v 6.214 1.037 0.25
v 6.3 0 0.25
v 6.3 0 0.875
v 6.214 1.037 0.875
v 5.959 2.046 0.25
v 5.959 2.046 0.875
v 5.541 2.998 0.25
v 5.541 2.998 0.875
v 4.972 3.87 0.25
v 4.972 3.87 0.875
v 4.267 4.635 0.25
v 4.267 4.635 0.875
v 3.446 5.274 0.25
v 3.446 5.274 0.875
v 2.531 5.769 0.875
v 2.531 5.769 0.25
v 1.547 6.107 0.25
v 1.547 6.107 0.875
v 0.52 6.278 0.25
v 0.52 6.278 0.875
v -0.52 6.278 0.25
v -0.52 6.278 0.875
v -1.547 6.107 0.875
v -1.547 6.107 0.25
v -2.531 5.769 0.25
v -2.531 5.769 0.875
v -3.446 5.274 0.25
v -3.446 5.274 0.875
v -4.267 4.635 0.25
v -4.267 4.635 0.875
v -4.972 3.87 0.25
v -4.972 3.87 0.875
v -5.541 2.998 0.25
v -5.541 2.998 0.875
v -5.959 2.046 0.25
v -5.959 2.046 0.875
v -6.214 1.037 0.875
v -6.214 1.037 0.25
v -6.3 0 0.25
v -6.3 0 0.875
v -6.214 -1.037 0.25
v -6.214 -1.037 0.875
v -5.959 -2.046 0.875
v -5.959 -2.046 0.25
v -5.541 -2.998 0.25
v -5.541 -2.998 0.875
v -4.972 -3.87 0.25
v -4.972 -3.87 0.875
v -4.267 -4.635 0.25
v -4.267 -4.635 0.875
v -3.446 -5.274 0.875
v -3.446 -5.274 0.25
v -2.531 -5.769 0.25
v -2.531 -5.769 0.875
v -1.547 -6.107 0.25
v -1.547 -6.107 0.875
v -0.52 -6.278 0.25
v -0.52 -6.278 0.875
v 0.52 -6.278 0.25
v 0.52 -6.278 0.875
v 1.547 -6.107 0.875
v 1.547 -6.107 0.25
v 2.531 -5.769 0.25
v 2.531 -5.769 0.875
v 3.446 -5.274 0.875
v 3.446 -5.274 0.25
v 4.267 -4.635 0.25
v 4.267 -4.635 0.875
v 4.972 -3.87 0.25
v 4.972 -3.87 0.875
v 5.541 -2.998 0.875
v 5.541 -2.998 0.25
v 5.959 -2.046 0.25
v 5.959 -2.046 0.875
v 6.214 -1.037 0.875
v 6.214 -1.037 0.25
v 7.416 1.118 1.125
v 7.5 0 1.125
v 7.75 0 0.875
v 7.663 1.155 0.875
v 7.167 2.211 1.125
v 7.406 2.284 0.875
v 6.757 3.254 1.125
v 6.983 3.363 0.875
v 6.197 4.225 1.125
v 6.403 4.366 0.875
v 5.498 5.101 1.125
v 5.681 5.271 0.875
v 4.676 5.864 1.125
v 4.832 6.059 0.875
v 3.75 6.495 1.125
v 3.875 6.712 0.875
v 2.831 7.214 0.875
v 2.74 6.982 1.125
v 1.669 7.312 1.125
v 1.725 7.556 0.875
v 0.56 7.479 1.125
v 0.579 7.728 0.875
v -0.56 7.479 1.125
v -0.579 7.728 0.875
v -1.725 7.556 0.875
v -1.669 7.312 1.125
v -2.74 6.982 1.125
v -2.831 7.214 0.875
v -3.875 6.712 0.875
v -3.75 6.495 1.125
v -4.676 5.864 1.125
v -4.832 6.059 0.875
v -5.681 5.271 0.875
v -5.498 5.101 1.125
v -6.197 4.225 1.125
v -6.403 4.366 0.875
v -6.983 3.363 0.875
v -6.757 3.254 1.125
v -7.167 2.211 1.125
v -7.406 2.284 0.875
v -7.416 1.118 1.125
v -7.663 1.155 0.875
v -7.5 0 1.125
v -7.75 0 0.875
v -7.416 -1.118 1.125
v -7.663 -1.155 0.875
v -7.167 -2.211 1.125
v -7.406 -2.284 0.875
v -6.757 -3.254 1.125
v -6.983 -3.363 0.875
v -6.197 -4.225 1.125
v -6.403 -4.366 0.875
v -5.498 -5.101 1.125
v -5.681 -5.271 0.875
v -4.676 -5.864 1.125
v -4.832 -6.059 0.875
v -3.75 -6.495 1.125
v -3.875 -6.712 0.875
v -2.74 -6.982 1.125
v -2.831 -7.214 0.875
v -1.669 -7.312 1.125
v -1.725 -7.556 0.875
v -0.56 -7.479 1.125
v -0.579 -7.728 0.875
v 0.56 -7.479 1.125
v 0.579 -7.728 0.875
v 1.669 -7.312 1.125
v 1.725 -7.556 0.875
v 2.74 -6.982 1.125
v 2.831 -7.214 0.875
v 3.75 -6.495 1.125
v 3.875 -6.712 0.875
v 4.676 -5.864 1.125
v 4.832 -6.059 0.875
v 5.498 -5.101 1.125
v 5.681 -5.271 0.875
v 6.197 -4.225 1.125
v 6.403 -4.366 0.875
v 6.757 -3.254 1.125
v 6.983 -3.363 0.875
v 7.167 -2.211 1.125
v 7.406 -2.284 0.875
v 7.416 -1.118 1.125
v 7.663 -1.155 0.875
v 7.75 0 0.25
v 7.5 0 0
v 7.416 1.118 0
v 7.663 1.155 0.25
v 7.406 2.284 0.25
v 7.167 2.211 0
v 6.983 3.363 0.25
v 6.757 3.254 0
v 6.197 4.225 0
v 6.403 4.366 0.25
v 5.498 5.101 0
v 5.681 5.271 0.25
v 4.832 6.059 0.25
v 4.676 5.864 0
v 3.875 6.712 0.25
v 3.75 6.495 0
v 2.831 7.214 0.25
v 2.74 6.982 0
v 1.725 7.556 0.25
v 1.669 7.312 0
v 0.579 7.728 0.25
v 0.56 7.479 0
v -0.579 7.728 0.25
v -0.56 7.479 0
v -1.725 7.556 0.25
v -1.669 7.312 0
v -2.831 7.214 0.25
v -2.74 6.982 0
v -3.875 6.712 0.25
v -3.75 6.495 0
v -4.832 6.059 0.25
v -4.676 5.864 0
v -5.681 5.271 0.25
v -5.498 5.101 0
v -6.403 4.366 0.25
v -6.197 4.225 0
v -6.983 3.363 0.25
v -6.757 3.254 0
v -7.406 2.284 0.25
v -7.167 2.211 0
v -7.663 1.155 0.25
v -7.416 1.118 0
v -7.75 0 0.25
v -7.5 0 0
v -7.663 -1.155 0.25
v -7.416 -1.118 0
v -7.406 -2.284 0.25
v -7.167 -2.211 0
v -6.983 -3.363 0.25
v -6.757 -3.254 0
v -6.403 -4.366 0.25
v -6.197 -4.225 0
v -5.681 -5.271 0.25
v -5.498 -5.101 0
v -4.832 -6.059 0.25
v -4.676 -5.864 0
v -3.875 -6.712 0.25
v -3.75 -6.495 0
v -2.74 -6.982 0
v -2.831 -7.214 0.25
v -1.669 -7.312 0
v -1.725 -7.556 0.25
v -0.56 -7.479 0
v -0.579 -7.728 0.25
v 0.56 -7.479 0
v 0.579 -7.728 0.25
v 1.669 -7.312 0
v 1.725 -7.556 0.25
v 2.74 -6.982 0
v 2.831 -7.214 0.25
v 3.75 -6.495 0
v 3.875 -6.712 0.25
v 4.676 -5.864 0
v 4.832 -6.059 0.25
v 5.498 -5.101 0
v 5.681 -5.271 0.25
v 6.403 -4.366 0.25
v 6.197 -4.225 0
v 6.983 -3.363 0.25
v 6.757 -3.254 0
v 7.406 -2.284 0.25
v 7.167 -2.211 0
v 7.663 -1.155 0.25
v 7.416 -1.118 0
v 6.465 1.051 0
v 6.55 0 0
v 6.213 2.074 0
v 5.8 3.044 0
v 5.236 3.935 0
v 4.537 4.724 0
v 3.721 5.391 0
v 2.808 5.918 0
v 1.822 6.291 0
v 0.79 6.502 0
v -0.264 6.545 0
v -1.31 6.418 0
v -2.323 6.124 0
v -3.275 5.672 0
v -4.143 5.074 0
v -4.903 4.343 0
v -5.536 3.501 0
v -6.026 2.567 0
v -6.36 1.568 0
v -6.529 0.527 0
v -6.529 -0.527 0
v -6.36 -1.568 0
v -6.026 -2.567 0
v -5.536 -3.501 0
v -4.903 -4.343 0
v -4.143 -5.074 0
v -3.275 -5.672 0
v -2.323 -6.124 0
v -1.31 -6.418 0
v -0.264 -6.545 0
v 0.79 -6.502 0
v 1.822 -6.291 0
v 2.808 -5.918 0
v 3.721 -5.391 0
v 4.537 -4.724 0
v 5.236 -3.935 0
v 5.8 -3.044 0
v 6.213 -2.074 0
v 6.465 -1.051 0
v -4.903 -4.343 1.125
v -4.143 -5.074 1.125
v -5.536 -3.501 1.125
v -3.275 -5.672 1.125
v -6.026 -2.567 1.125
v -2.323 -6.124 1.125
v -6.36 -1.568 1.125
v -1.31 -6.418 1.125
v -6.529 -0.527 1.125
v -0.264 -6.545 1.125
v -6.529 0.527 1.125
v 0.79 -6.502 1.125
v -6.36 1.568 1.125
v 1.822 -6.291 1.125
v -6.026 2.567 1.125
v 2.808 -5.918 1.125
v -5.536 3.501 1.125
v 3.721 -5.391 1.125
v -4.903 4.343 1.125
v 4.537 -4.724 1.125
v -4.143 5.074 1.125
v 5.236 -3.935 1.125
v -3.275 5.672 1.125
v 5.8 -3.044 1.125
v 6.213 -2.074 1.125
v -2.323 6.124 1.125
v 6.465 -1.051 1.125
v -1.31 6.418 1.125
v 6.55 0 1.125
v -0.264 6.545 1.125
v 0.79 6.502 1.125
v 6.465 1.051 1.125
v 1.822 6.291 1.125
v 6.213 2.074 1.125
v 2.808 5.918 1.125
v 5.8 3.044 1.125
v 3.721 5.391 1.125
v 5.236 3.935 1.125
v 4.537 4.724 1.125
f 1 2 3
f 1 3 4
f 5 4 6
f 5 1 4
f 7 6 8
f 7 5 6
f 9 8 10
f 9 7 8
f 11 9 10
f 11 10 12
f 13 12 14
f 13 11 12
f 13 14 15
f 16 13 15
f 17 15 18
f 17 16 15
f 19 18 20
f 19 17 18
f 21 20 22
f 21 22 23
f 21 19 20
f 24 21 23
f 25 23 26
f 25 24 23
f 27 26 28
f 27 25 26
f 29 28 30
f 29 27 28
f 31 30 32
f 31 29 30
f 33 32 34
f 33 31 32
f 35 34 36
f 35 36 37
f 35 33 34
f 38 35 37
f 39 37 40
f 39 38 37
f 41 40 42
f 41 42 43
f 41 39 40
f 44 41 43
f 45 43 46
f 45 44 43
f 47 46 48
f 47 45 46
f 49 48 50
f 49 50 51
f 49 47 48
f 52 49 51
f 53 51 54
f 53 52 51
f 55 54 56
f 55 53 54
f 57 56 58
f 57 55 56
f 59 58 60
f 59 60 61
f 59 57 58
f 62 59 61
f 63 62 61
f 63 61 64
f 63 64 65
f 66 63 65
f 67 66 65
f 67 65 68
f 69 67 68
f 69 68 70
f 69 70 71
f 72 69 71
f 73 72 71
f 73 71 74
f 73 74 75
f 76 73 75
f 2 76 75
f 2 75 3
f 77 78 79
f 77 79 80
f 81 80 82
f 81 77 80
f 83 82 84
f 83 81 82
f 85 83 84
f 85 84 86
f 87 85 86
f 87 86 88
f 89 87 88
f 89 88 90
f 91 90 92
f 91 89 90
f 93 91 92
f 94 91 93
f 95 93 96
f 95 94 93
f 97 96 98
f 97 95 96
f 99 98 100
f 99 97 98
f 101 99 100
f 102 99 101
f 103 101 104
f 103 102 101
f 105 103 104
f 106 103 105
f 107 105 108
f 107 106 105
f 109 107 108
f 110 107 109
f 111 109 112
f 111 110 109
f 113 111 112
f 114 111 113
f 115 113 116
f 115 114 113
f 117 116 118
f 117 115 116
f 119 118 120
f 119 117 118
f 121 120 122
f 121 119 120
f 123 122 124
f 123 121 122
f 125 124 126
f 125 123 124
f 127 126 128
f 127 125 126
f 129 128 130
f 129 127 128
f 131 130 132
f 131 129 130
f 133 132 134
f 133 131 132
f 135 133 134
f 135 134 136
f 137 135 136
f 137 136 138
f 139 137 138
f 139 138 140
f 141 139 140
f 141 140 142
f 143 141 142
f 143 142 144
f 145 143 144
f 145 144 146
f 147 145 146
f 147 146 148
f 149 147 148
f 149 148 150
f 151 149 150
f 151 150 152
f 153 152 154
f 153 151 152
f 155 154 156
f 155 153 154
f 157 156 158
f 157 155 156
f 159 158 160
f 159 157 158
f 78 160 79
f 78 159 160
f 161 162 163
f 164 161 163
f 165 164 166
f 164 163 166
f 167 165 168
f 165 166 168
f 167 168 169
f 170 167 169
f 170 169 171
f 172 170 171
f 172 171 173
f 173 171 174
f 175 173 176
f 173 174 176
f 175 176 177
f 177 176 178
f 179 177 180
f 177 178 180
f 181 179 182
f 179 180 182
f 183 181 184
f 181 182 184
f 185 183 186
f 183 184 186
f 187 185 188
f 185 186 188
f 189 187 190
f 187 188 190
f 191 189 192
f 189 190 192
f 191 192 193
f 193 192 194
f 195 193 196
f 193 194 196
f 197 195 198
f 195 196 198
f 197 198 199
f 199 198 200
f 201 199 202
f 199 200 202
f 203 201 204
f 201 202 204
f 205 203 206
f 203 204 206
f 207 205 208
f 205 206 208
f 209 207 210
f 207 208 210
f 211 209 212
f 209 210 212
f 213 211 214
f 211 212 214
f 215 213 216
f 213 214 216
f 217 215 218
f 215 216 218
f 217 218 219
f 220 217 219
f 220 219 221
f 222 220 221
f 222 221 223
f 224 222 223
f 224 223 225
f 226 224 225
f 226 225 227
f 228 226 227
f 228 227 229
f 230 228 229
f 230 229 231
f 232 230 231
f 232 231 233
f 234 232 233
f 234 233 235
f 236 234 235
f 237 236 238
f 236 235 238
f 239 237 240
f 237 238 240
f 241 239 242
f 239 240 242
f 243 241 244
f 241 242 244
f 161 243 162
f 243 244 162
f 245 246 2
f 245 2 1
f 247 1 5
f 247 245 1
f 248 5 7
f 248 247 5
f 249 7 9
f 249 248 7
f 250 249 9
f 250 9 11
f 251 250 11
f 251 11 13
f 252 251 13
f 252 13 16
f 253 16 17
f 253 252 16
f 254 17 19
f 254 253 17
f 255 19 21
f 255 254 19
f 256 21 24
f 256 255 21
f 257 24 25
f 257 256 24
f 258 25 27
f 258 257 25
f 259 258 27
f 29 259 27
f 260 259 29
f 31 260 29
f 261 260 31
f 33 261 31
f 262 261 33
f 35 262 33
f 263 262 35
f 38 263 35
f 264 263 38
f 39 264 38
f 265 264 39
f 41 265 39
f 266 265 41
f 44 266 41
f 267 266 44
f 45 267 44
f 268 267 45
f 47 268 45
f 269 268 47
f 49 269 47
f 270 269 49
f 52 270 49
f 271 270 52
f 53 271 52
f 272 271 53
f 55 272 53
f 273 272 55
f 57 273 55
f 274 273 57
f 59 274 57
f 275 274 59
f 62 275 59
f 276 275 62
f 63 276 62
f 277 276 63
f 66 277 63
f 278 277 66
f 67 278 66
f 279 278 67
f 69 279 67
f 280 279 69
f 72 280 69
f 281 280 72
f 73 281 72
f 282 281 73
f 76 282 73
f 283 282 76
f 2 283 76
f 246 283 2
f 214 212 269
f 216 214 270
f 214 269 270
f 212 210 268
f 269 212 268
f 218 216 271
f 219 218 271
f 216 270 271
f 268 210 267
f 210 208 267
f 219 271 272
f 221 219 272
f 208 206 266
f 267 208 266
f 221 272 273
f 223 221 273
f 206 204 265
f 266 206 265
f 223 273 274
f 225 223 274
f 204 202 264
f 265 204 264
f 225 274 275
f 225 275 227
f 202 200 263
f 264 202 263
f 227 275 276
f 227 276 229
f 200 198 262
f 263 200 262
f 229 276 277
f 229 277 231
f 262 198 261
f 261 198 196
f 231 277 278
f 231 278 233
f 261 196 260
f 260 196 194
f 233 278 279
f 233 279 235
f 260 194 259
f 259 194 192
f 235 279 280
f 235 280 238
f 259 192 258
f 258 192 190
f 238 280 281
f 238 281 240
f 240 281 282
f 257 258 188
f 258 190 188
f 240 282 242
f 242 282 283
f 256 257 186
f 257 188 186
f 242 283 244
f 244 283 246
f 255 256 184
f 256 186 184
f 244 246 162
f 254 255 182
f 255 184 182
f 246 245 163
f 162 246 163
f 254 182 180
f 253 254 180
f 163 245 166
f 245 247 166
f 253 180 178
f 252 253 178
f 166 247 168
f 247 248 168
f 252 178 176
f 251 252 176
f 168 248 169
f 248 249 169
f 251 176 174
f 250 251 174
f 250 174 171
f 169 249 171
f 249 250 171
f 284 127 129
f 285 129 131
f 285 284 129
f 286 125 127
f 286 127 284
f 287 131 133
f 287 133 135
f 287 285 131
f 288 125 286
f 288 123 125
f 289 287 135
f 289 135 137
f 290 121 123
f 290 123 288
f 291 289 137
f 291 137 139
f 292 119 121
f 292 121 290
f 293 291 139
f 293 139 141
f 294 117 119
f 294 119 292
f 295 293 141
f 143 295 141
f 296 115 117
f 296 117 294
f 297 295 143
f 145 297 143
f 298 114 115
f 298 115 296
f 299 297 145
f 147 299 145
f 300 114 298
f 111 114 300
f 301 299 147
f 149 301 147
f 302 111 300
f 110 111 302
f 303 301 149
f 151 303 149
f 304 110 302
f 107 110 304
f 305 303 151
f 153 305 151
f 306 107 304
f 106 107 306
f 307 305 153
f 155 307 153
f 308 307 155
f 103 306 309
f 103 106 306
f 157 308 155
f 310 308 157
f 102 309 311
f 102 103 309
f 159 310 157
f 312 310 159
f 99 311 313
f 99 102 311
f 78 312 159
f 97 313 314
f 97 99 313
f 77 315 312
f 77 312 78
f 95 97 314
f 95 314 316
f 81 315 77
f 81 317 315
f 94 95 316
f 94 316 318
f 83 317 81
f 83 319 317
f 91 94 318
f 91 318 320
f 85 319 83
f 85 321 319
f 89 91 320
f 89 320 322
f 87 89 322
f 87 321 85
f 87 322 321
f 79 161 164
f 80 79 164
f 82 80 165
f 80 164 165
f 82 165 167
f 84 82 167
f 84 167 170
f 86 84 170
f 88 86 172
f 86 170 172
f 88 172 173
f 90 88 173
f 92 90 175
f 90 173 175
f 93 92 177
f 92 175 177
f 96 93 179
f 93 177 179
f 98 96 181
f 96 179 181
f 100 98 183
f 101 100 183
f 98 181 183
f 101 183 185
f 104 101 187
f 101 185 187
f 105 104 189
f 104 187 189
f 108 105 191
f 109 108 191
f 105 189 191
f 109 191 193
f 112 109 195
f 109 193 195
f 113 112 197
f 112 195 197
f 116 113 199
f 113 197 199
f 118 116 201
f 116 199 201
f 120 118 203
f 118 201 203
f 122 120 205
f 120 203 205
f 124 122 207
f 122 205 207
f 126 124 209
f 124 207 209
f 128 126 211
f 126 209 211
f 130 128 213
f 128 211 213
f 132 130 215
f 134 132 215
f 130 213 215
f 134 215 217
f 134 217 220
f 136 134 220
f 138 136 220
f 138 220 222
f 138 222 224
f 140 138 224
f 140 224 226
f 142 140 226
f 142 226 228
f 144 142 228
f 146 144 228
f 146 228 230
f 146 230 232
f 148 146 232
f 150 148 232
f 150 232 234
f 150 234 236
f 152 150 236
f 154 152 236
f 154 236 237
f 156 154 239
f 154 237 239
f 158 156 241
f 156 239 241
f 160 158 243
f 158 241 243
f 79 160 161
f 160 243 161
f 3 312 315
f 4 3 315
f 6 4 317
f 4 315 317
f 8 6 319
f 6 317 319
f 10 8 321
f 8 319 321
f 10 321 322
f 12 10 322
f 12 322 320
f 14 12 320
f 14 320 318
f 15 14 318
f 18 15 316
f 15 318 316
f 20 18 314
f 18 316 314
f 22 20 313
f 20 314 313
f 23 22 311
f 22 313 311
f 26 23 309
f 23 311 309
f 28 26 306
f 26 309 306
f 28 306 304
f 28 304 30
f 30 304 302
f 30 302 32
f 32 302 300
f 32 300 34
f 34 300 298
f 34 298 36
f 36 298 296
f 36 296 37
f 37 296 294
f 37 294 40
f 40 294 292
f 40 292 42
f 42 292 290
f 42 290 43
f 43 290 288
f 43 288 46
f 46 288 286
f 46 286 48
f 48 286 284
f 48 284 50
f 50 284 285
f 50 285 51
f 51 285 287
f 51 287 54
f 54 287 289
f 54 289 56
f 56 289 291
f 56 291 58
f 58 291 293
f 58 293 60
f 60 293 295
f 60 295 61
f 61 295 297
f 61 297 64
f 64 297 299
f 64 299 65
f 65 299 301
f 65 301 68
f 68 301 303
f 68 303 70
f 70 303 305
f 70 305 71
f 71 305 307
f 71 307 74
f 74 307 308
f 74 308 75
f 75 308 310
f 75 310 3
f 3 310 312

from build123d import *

# Parameters (mm, degrees)
SKETCH_R     = 7.75
SKETCH_R_2   = 6.3
PAD_DEPTH    = 1.125
CHAMFER_SIZE = 0.25


with BuildPart() as part:
    # Sketch → Pad (new body)
    with BuildSketch(Plane.XY):
        Circle(SKETCH_R)
        Circle(SKETCH_R_2, mode=Mode.SUBTRACT)
    extrude(amount=PAD_DEPTH)

    # Chamfer
    chamfer_edges = [part.edges().sort_by_distance(p)[0] for p in [
        (-7.75, 0, 1.125),
        (-6.3, 0, 1.125),
        (-7.75, 0, 0),
        (-6.3, 0, 0),
    ]]
    chamfer(chamfer_edges, length=CHAMFER_SIZE)


solid = part.part
